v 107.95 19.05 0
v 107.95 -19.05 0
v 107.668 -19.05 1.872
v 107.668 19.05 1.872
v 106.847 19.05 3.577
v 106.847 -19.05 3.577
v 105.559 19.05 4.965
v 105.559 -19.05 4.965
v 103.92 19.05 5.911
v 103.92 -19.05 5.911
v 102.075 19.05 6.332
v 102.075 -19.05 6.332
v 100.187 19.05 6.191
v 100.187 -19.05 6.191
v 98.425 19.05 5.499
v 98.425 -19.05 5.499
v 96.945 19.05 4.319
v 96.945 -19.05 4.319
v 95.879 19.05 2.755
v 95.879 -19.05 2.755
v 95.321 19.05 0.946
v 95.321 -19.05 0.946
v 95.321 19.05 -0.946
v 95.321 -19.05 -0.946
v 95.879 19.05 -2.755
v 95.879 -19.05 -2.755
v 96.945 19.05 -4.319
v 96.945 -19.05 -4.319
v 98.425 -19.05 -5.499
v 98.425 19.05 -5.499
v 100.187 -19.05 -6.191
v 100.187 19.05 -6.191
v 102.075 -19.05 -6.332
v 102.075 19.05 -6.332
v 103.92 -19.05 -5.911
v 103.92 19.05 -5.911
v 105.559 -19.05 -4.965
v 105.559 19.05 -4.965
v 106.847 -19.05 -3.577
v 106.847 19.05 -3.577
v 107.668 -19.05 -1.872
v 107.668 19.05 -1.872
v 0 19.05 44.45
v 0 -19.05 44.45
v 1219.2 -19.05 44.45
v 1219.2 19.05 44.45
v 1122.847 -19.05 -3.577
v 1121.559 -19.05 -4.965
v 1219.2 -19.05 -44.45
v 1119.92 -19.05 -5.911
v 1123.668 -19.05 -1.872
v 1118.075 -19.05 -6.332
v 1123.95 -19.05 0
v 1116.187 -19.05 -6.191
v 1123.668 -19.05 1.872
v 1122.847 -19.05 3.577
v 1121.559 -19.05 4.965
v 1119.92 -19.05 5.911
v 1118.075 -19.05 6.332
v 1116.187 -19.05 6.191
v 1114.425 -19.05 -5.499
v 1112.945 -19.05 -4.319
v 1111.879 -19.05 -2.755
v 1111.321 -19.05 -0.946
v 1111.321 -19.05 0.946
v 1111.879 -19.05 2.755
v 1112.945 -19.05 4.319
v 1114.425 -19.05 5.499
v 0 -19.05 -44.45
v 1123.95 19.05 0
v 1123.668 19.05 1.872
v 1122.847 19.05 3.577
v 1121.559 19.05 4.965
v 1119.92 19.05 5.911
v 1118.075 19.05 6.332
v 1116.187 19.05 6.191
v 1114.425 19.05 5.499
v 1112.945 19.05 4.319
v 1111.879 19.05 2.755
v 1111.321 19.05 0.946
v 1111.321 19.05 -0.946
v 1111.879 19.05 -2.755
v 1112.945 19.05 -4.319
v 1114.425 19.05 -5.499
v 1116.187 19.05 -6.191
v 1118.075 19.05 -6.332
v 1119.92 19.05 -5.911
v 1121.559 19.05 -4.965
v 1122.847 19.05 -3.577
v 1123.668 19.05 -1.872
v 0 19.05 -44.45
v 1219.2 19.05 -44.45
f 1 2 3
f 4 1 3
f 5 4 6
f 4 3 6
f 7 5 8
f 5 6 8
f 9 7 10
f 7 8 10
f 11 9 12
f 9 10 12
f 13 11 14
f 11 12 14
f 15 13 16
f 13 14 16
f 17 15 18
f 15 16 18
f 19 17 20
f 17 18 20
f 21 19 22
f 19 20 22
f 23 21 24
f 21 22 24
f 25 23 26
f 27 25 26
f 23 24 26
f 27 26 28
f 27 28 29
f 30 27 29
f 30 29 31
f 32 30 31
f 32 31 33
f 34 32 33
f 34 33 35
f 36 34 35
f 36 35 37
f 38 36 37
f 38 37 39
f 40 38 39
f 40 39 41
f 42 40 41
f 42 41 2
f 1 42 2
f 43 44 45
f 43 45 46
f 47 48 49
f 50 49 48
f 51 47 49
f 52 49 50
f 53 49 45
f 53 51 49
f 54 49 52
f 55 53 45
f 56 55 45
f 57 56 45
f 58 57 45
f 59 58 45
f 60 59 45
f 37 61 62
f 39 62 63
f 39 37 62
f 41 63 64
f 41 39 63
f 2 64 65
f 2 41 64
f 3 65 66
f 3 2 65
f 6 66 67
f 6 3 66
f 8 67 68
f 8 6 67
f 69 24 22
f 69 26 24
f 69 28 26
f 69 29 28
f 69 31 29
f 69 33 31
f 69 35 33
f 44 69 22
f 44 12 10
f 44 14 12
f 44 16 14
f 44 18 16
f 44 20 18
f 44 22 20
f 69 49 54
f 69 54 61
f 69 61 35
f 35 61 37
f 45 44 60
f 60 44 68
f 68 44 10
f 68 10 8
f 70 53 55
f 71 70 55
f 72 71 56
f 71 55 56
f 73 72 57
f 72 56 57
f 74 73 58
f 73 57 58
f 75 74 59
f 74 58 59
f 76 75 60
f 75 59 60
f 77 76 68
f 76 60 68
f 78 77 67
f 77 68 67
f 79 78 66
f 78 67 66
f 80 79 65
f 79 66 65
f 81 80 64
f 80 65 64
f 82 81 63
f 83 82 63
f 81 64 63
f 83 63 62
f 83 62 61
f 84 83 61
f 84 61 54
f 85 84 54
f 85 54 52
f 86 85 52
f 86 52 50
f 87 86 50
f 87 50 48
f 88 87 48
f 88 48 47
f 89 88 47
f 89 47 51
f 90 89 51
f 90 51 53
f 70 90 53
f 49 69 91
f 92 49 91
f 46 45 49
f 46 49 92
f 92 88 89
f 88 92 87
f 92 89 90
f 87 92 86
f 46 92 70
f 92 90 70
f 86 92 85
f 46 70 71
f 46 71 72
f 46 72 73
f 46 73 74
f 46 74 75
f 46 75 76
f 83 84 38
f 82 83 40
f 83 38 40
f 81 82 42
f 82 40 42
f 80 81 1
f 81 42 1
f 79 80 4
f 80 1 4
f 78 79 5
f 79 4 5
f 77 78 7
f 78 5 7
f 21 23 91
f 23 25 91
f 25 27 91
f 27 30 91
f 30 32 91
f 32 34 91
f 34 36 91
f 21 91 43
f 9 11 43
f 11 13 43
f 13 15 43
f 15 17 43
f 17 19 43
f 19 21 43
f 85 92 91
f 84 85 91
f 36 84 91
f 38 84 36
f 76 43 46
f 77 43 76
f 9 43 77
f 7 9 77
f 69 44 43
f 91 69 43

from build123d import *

# Parameters (mm, degrees)
F0_W     = 38.1
F0_H     = 88.9
F1_DEPTH = 1219.2
F2_R     = 6.35
F3_DEPTH = 38.101
F4_R     = 6.35
F5_DEPTH = 38.101


with BuildPart() as f1:
    # F0 (on Right) → F1 (new body)
    with BuildSketch(Plane.YZ):
        Rectangle(F0_W, F0_H)
    extrude(amount=F1_DEPTH)

    # F2 (on face) → F3 (cut, through all)
    with BuildSketch(Plane.XZ.offset(19.05)):
        with Locations((101.6, 0)):
            Circle(F2_R)
    extrude(amount=-F3_DEPTH, mode=Mode.SUBTRACT)

    # F4 (on face) → F5 (cut, through all)
    with BuildSketch(Plane.XZ.offset(19.05)):
        with Locations((1117.6, 0)):
            Circle(F4_R)
    extrude(amount=-F5_DEPTH, mode=Mode.SUBTRACT)


solid = f1.part
